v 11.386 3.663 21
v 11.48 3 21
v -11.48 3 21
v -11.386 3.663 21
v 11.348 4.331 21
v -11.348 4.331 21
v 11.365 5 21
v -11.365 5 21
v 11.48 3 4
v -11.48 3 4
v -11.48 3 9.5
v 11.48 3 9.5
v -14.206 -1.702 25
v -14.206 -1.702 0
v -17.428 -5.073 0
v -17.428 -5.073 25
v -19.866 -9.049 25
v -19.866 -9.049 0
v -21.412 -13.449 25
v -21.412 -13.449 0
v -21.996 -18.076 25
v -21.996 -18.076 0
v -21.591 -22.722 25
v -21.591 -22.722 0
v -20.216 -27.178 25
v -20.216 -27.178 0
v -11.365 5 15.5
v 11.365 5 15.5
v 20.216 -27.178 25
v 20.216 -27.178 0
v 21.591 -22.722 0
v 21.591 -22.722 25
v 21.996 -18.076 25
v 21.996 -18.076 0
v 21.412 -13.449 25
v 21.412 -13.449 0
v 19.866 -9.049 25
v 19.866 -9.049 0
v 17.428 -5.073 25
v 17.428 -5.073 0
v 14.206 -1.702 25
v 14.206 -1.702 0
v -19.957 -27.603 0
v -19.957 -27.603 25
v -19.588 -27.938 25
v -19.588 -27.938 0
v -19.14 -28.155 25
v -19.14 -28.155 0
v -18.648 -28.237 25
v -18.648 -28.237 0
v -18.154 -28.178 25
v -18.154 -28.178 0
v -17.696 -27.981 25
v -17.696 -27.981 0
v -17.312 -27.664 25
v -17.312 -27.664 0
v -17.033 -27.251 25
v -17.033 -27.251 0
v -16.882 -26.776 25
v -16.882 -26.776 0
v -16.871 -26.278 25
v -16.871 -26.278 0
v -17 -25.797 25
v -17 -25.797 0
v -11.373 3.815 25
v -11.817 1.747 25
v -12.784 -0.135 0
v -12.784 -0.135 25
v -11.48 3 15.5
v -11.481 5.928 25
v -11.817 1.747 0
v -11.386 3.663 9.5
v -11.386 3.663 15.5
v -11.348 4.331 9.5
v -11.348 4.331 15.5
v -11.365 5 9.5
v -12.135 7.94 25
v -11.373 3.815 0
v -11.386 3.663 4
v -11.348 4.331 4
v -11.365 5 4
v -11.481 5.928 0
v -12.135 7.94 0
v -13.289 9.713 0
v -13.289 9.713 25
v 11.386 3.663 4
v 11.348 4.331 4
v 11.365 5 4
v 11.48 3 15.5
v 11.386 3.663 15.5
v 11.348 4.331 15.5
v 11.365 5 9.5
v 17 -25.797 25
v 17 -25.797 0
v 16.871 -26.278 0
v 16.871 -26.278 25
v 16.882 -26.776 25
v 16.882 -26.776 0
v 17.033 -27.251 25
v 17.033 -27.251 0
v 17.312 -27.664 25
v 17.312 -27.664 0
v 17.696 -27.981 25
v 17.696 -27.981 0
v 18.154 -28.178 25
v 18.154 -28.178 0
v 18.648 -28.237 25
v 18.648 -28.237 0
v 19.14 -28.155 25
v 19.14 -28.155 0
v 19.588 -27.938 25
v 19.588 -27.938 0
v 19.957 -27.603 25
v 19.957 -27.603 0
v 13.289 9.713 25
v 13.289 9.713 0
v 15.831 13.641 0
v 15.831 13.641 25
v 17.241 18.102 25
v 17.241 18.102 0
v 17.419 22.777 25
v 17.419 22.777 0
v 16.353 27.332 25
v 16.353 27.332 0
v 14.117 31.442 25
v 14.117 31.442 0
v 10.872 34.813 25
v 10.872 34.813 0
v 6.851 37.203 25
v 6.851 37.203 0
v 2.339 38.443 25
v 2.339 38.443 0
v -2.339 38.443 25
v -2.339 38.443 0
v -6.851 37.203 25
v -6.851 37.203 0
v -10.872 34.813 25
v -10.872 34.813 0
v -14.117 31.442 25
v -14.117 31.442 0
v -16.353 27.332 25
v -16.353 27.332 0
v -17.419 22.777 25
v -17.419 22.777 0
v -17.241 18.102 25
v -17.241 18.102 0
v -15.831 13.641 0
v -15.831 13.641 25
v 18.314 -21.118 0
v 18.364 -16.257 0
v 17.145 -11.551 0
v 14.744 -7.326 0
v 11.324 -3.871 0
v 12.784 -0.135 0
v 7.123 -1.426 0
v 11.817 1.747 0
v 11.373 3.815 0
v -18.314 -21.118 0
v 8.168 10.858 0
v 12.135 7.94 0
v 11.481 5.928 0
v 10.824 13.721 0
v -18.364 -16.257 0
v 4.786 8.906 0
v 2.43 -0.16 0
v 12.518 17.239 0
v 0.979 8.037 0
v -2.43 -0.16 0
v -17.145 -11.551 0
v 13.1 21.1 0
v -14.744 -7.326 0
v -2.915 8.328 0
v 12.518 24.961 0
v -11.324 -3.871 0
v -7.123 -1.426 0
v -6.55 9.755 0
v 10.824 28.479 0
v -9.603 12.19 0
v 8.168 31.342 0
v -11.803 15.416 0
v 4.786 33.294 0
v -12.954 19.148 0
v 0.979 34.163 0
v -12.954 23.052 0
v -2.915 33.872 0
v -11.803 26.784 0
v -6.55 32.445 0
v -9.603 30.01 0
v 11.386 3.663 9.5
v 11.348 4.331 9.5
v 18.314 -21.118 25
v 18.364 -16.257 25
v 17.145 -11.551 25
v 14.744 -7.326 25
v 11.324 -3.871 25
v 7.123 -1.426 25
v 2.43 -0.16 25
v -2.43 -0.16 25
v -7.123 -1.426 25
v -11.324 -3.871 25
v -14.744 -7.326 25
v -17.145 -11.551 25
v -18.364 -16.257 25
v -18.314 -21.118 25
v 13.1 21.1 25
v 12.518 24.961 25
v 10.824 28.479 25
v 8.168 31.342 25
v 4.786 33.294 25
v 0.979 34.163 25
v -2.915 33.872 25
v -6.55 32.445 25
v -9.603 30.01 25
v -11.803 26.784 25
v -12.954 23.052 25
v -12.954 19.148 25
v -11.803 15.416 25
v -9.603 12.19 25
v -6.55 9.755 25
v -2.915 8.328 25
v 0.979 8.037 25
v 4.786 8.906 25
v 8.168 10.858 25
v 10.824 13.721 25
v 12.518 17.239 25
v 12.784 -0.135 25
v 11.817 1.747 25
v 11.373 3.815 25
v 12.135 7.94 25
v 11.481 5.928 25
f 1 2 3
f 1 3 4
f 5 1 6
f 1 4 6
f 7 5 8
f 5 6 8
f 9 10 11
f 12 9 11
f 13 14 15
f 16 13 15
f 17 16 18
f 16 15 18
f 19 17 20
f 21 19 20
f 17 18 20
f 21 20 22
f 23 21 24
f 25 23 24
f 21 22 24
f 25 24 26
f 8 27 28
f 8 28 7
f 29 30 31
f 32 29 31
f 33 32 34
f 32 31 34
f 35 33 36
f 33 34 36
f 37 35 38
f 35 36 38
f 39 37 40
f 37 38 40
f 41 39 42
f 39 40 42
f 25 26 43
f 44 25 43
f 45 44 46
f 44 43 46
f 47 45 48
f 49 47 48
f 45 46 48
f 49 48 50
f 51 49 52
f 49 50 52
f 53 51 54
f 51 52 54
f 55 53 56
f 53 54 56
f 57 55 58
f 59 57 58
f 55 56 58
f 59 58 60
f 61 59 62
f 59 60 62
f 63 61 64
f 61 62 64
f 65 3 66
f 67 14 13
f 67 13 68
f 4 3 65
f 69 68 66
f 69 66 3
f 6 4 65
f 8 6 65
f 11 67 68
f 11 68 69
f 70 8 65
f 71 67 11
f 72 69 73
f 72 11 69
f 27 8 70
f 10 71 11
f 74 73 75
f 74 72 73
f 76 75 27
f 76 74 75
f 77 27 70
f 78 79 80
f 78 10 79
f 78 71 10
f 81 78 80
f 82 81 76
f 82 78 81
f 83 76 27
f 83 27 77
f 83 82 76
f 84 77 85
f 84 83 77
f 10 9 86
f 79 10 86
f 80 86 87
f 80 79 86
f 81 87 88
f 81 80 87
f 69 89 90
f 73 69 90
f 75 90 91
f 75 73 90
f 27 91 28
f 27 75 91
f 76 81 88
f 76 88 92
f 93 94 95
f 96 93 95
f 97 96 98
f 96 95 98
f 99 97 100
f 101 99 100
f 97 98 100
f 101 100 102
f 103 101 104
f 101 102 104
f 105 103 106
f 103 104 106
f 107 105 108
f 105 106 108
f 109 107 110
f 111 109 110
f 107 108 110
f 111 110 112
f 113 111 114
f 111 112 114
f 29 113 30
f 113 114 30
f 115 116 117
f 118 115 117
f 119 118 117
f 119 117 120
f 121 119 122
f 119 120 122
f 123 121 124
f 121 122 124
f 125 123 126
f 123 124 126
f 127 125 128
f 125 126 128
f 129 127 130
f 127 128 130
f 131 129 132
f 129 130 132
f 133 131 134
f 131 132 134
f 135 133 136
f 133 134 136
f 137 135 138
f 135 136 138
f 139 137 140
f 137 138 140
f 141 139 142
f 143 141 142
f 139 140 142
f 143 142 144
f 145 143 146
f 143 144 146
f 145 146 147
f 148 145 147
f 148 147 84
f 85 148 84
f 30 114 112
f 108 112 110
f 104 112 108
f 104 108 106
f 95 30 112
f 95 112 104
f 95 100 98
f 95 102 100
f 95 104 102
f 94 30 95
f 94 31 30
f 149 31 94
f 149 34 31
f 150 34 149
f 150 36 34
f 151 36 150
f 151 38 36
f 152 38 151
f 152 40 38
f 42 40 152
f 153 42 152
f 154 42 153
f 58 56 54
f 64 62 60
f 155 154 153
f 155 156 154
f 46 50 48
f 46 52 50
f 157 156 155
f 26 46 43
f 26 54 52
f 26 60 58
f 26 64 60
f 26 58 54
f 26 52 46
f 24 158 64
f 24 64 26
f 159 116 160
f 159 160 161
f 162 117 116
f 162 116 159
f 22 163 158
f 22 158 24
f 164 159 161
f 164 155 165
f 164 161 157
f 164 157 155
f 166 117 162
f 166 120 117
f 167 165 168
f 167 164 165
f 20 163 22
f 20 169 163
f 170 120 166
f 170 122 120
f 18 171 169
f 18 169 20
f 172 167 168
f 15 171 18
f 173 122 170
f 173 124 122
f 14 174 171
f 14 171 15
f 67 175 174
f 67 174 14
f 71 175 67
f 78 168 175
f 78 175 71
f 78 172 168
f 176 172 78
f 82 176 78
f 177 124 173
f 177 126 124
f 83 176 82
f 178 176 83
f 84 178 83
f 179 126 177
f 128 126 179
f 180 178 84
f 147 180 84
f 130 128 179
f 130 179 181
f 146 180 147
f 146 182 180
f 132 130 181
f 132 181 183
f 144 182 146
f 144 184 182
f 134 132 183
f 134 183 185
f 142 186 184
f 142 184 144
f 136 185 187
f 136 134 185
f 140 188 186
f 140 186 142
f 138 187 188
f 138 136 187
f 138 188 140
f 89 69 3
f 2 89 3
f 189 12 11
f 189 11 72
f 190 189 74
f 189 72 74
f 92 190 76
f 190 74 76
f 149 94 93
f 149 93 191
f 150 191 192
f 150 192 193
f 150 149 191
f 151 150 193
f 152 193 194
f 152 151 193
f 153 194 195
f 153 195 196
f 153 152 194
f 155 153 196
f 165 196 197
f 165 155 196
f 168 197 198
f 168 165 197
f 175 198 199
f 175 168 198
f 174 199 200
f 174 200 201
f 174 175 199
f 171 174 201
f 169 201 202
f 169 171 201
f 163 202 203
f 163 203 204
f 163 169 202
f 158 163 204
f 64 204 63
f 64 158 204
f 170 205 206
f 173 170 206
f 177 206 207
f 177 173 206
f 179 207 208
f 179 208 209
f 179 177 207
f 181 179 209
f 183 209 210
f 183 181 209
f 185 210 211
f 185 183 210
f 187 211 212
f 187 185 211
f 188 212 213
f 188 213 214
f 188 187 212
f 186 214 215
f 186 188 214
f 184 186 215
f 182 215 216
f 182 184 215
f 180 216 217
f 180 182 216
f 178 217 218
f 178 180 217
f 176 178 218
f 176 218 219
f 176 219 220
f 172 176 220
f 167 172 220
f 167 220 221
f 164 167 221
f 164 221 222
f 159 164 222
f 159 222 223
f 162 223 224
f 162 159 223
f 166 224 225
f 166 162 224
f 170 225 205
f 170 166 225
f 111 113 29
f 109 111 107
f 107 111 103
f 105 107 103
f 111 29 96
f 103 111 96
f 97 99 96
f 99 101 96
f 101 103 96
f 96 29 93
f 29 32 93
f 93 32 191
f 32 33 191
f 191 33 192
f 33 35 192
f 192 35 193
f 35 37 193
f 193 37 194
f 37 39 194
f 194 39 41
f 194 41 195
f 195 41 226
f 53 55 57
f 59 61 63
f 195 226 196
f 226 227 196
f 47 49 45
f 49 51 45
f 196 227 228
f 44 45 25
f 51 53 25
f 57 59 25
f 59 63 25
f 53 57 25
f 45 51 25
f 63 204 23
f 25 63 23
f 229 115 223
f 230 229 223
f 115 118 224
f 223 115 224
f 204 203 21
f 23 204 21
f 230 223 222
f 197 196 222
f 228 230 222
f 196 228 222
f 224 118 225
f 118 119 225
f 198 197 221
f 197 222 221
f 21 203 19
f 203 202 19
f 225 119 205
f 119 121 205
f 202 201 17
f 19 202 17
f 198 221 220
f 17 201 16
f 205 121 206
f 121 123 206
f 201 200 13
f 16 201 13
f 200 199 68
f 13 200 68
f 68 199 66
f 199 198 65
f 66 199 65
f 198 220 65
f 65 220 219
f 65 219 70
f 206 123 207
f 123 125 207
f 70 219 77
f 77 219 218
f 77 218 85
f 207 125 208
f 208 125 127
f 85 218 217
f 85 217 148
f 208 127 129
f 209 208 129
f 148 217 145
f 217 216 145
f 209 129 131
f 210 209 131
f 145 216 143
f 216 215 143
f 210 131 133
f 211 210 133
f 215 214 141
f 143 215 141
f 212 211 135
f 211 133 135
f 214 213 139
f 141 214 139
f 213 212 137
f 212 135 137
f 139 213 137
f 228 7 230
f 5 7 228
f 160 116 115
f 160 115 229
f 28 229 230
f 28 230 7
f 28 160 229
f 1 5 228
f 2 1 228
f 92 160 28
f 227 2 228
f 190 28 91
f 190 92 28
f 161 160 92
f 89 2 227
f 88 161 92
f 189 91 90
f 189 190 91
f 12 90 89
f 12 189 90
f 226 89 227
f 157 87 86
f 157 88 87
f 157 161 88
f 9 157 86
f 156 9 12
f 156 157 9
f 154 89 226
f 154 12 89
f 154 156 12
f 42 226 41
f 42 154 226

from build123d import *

# Parameters (mm, degrees)
SKETCH_R          = 13.1
PAD_DEPTH         = 25
SKETCH001_W       = 2
SKETCH001_H       = 5.5
POCKET_DEPTH      = 22.001
POCKET_DEPTH_BACK = 22.001


with BuildPart() as part:
    # Sketch → Pad (new body)
    with BuildSketch(Plane.XY):
        with BuildLine():
            ThreePointArc((17, -25.79726), (0, 0), (-17, -25.79726))
            ThreePointArc((-20.216216, -27.177822), (-17.917827, -28.095649), (-17, -25.79726))
            ThreePointArc((-14.206112, -1.701596), (-21.412232, -13.448634), (-20.216216, -27.177822))
            ThreePointArc((-14.206112, -1.701596), (-11.372558, 3.815069), (-13.288911, 9.713392))
            ThreePointArc((13.288911, 9.713392), (0, 38.6), (-13.288911, 9.713392))
            ThreePointArc((13.288911, 9.713392), (11.372558, 3.815069), (14.206112, -1.701596))
            ThreePointArc((20.216216, -27.177822), (21.412232, -13.448634), (14.206112, -1.701596))
            ThreePointArc((17, -25.79726), (17.917827, -28.095649), (20.216216, -27.177822))
        make_face()
        with Locations((0, 21.1)):
            Circle(SKETCH_R, mode=Mode.SUBTRACT)
    extrude(amount=PAD_DEPTH)

    # Sketch001 → Pocket (cut, two sides)
    with BuildSketch(Plane.YZ) as pocket_sk:
        with Locations((4, 6.75)):
            Rectangle(SKETCH001_W, SKETCH001_H)
        with Locations((4, 18.25)):
            Rectangle(SKETCH001_W, SKETCH001_H)
    extrude(amount=-POCKET_DEPTH, mode=Mode.SUBTRACT)
    extrude(pocket_sk.sketch, amount=POCKET_DEPTH_BACK, mode=Mode.SUBTRACT)


solid = part.part
